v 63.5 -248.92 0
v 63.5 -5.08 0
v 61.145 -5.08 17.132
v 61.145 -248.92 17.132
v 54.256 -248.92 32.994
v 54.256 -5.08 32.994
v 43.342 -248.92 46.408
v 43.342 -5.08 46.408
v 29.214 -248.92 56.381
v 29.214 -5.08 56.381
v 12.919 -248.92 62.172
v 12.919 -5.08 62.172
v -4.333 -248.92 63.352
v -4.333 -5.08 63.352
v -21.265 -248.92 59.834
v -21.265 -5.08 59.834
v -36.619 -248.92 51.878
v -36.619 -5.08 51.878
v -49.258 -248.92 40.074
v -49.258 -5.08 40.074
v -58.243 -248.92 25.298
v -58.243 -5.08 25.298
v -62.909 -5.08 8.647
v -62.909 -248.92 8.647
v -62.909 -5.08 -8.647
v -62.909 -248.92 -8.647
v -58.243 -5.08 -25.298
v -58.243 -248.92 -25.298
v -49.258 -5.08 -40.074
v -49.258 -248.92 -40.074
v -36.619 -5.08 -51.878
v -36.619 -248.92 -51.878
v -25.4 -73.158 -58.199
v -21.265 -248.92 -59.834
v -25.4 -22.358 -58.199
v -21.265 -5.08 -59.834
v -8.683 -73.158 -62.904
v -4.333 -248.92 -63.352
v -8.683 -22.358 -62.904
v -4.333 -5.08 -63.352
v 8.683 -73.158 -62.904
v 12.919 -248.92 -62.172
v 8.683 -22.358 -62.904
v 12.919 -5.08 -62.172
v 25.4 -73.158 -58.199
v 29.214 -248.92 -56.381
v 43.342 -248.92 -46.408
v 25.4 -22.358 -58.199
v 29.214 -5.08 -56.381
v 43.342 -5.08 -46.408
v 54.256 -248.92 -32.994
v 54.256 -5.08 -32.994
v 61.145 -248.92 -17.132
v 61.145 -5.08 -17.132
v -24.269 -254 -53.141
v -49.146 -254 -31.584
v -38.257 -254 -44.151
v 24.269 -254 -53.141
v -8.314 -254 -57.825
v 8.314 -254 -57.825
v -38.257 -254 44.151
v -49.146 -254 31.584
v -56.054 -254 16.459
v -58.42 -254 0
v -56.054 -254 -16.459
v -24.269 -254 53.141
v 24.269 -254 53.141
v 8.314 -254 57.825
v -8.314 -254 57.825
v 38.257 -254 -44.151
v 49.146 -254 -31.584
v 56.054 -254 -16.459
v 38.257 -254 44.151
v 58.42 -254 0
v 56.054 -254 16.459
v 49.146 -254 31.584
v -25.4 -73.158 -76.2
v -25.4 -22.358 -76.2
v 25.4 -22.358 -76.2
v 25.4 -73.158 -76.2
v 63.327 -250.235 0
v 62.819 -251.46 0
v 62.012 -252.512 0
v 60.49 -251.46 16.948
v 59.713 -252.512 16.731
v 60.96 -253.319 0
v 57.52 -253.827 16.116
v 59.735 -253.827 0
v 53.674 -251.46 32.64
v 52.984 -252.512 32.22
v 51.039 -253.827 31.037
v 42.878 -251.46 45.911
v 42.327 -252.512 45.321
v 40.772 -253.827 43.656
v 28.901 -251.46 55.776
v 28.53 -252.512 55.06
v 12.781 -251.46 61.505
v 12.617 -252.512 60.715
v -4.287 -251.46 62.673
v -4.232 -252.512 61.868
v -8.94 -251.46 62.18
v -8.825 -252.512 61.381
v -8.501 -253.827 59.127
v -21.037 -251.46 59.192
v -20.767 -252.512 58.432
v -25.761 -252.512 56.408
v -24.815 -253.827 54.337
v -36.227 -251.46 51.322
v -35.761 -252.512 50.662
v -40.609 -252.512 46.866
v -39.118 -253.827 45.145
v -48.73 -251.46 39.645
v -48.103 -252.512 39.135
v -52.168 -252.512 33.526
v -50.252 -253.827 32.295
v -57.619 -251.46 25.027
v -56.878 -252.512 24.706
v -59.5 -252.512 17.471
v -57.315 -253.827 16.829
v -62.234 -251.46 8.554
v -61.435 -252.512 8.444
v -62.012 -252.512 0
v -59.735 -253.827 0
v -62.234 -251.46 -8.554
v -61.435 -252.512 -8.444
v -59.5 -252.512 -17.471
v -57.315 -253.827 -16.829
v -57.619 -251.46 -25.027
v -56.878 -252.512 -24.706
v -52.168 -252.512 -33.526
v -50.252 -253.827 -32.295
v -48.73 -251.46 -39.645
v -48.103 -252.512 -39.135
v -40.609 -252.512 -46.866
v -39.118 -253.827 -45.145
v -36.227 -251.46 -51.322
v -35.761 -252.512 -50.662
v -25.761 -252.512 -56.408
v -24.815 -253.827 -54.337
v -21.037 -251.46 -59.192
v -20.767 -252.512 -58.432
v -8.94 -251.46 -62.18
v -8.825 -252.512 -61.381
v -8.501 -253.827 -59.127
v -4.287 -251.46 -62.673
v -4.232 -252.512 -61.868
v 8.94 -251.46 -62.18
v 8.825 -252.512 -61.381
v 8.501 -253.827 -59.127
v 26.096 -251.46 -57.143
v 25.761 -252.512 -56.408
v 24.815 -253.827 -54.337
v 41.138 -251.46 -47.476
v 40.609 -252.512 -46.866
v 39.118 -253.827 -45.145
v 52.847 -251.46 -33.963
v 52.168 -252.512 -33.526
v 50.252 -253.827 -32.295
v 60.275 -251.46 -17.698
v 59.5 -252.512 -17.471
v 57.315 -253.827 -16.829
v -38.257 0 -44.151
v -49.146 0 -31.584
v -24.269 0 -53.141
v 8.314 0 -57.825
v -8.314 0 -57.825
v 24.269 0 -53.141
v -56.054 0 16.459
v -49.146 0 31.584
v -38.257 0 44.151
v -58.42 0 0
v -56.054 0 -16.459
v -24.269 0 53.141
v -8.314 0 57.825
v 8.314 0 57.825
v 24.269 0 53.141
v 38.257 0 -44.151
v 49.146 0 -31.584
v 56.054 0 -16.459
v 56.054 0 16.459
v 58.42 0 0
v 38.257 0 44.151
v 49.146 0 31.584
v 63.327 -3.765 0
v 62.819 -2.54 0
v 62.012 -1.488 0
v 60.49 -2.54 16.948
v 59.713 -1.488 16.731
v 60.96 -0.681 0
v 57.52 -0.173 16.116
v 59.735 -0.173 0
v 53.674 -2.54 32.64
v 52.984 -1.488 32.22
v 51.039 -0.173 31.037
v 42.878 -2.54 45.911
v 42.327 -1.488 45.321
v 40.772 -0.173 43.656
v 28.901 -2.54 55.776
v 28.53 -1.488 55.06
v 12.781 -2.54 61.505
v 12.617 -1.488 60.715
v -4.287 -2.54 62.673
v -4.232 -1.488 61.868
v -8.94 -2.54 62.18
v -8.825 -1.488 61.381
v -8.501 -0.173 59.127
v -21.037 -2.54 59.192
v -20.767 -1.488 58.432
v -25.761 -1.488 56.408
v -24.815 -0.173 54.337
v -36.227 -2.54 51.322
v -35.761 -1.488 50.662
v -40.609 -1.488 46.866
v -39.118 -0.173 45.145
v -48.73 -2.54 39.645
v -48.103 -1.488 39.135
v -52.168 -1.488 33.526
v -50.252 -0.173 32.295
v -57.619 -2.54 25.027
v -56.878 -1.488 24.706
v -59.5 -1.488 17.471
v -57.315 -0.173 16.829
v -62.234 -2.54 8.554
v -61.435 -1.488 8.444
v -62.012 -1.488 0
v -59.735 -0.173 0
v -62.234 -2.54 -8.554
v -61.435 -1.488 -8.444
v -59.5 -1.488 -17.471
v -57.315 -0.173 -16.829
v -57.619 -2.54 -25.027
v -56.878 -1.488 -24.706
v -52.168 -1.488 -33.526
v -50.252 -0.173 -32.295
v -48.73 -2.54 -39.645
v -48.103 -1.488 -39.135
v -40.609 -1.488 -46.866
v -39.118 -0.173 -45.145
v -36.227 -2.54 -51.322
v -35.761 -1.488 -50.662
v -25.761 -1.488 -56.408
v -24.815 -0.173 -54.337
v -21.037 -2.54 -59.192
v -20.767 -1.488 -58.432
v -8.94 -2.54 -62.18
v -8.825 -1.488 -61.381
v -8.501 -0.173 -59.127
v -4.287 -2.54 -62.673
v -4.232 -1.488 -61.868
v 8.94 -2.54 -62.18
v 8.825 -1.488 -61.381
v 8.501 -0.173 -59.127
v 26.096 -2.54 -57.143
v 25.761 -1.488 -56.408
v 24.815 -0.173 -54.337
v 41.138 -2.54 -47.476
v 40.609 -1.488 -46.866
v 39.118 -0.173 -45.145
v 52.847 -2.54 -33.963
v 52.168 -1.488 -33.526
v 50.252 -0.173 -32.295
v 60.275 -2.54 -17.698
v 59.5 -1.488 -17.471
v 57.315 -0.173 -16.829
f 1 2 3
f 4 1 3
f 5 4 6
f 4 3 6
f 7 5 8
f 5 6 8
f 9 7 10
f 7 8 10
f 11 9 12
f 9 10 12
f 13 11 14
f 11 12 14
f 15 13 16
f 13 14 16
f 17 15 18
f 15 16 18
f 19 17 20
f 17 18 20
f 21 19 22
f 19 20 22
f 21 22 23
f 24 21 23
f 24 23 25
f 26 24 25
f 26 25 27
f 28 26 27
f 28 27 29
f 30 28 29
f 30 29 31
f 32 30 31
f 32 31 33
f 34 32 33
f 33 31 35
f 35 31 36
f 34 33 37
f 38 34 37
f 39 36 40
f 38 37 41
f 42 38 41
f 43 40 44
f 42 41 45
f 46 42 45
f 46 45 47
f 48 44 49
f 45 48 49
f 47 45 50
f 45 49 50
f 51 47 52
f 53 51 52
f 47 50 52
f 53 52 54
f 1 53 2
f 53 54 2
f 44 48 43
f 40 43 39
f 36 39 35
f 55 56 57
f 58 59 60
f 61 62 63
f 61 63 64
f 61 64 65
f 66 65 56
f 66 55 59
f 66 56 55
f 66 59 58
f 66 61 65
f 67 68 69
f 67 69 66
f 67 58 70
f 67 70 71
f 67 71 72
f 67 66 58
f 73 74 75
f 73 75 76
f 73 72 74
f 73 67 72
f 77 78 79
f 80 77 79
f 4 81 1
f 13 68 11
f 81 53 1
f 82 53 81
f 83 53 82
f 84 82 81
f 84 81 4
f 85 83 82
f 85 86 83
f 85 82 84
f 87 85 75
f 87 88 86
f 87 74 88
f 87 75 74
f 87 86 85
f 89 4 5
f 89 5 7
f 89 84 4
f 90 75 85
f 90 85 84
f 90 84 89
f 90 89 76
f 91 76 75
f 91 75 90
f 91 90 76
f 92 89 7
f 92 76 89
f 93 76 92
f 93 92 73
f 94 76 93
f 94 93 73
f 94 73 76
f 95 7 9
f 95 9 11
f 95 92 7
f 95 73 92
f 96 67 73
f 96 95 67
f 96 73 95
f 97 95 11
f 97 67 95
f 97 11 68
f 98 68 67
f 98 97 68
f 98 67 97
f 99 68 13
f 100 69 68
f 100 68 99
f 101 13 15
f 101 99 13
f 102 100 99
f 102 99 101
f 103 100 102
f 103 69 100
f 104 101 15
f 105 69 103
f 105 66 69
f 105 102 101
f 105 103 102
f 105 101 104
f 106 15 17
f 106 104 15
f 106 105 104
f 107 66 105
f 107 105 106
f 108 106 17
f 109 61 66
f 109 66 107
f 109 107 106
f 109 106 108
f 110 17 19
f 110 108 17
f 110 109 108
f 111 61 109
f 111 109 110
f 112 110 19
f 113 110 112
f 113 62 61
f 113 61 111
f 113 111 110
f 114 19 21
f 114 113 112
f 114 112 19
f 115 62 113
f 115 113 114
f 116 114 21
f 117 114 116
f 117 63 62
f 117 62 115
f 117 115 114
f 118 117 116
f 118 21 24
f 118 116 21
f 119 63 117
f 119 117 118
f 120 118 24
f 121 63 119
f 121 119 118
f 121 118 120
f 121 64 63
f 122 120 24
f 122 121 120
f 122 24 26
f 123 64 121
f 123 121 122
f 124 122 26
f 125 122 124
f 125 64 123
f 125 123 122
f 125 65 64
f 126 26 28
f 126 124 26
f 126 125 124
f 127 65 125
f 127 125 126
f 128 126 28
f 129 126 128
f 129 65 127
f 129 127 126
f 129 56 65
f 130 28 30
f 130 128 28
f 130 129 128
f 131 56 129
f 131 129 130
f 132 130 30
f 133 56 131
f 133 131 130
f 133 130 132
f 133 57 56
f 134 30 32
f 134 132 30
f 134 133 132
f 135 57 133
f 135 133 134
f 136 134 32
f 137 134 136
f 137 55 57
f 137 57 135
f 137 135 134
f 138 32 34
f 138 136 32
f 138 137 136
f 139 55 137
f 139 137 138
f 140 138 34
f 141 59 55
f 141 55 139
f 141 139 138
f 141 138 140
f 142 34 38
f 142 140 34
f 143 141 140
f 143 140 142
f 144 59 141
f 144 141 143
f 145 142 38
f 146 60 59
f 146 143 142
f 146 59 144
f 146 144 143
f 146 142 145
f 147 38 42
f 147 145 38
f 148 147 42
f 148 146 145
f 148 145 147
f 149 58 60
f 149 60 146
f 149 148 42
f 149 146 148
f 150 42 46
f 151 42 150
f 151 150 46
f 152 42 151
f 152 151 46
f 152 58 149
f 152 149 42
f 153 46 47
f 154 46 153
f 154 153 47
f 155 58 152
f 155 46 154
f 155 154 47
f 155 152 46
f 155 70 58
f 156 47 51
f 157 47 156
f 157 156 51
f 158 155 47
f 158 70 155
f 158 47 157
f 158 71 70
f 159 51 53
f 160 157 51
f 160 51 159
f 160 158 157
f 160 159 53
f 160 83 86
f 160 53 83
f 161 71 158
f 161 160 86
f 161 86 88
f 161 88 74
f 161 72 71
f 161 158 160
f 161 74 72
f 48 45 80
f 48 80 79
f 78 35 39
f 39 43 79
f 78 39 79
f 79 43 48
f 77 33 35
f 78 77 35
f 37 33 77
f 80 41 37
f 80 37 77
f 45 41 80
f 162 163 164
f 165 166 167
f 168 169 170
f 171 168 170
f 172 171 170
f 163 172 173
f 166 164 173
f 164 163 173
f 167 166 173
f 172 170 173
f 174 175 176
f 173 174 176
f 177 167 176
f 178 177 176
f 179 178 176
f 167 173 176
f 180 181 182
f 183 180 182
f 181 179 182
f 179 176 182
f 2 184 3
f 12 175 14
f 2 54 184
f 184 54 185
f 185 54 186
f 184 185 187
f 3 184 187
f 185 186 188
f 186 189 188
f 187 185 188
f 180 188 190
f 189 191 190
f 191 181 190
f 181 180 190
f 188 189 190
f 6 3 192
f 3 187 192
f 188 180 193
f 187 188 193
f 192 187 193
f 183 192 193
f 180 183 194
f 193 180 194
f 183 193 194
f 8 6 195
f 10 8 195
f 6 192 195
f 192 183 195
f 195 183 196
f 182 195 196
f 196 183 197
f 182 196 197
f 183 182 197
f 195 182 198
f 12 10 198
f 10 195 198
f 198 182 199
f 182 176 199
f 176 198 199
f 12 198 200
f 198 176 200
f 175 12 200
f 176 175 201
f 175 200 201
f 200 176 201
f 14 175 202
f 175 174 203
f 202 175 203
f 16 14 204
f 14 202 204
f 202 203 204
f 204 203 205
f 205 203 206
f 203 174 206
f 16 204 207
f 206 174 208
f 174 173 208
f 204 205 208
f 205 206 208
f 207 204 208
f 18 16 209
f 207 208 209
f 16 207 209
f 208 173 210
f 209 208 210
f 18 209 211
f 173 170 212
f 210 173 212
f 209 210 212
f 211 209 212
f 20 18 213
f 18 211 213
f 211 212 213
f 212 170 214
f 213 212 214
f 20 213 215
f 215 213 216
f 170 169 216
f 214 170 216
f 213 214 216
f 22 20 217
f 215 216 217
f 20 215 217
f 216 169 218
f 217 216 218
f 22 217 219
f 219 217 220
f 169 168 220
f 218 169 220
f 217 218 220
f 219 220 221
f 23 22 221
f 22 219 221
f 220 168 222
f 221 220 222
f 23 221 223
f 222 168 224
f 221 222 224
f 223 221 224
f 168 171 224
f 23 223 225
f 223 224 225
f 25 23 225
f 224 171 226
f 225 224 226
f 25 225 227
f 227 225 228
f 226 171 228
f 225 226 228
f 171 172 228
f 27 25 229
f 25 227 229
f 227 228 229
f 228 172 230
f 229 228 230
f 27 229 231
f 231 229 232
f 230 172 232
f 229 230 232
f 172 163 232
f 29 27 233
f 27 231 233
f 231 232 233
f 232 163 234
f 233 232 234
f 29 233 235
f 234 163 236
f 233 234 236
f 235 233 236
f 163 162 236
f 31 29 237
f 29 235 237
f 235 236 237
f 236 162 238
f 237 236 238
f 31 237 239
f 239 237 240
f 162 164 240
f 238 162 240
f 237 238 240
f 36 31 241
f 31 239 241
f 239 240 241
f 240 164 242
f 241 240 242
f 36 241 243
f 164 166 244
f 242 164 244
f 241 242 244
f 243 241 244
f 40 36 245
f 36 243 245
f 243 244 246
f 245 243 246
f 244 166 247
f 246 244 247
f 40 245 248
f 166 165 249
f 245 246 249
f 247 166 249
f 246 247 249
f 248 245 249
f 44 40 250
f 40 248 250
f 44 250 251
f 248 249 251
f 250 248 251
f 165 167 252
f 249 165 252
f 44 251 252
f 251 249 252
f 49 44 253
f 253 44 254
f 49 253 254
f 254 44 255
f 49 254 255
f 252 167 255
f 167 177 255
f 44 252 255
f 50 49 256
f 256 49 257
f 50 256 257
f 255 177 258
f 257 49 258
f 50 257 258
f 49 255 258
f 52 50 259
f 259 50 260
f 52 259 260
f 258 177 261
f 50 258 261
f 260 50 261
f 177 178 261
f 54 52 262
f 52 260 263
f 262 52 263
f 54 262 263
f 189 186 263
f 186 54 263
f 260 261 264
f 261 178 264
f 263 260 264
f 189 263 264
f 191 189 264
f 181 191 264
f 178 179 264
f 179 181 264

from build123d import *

# Parameters (mm, degrees)
F0_R     = 63.5
F1_DEPTH = 254
F4_R     = 5.08
F5_W     = 50.8
F5_H     = 50.8
F6_DEPTH = 76.2


# Not quite as in the source:
# - the program builds the solid bodies; features that only make, move or delete a surface that nothing else refers to are left out


with BuildPart() as f1:
    # F0 (on Front) → F1 (new body)
    with BuildSketch(Plane.XZ):
        Circle(F0_R)
    extrude(amount=F1_DEPTH)

    # F4
    f4_edges = [f1.edges().sort_by_distance(p)[0] for p in [
        (-63.5, -254, 0),
        (-63.5, 0, 0),
    ]]
    fillet(f4_edges, radius=F4_R)

    # F5 (on Top) → F6 (join)
    with BuildSketch(Plane.XY):
        with Locations((0, -47.7578863502)):
            Rectangle(F5_W, F5_H)
    extrude(amount=-F6_DEPTH)


solid = f1.part
